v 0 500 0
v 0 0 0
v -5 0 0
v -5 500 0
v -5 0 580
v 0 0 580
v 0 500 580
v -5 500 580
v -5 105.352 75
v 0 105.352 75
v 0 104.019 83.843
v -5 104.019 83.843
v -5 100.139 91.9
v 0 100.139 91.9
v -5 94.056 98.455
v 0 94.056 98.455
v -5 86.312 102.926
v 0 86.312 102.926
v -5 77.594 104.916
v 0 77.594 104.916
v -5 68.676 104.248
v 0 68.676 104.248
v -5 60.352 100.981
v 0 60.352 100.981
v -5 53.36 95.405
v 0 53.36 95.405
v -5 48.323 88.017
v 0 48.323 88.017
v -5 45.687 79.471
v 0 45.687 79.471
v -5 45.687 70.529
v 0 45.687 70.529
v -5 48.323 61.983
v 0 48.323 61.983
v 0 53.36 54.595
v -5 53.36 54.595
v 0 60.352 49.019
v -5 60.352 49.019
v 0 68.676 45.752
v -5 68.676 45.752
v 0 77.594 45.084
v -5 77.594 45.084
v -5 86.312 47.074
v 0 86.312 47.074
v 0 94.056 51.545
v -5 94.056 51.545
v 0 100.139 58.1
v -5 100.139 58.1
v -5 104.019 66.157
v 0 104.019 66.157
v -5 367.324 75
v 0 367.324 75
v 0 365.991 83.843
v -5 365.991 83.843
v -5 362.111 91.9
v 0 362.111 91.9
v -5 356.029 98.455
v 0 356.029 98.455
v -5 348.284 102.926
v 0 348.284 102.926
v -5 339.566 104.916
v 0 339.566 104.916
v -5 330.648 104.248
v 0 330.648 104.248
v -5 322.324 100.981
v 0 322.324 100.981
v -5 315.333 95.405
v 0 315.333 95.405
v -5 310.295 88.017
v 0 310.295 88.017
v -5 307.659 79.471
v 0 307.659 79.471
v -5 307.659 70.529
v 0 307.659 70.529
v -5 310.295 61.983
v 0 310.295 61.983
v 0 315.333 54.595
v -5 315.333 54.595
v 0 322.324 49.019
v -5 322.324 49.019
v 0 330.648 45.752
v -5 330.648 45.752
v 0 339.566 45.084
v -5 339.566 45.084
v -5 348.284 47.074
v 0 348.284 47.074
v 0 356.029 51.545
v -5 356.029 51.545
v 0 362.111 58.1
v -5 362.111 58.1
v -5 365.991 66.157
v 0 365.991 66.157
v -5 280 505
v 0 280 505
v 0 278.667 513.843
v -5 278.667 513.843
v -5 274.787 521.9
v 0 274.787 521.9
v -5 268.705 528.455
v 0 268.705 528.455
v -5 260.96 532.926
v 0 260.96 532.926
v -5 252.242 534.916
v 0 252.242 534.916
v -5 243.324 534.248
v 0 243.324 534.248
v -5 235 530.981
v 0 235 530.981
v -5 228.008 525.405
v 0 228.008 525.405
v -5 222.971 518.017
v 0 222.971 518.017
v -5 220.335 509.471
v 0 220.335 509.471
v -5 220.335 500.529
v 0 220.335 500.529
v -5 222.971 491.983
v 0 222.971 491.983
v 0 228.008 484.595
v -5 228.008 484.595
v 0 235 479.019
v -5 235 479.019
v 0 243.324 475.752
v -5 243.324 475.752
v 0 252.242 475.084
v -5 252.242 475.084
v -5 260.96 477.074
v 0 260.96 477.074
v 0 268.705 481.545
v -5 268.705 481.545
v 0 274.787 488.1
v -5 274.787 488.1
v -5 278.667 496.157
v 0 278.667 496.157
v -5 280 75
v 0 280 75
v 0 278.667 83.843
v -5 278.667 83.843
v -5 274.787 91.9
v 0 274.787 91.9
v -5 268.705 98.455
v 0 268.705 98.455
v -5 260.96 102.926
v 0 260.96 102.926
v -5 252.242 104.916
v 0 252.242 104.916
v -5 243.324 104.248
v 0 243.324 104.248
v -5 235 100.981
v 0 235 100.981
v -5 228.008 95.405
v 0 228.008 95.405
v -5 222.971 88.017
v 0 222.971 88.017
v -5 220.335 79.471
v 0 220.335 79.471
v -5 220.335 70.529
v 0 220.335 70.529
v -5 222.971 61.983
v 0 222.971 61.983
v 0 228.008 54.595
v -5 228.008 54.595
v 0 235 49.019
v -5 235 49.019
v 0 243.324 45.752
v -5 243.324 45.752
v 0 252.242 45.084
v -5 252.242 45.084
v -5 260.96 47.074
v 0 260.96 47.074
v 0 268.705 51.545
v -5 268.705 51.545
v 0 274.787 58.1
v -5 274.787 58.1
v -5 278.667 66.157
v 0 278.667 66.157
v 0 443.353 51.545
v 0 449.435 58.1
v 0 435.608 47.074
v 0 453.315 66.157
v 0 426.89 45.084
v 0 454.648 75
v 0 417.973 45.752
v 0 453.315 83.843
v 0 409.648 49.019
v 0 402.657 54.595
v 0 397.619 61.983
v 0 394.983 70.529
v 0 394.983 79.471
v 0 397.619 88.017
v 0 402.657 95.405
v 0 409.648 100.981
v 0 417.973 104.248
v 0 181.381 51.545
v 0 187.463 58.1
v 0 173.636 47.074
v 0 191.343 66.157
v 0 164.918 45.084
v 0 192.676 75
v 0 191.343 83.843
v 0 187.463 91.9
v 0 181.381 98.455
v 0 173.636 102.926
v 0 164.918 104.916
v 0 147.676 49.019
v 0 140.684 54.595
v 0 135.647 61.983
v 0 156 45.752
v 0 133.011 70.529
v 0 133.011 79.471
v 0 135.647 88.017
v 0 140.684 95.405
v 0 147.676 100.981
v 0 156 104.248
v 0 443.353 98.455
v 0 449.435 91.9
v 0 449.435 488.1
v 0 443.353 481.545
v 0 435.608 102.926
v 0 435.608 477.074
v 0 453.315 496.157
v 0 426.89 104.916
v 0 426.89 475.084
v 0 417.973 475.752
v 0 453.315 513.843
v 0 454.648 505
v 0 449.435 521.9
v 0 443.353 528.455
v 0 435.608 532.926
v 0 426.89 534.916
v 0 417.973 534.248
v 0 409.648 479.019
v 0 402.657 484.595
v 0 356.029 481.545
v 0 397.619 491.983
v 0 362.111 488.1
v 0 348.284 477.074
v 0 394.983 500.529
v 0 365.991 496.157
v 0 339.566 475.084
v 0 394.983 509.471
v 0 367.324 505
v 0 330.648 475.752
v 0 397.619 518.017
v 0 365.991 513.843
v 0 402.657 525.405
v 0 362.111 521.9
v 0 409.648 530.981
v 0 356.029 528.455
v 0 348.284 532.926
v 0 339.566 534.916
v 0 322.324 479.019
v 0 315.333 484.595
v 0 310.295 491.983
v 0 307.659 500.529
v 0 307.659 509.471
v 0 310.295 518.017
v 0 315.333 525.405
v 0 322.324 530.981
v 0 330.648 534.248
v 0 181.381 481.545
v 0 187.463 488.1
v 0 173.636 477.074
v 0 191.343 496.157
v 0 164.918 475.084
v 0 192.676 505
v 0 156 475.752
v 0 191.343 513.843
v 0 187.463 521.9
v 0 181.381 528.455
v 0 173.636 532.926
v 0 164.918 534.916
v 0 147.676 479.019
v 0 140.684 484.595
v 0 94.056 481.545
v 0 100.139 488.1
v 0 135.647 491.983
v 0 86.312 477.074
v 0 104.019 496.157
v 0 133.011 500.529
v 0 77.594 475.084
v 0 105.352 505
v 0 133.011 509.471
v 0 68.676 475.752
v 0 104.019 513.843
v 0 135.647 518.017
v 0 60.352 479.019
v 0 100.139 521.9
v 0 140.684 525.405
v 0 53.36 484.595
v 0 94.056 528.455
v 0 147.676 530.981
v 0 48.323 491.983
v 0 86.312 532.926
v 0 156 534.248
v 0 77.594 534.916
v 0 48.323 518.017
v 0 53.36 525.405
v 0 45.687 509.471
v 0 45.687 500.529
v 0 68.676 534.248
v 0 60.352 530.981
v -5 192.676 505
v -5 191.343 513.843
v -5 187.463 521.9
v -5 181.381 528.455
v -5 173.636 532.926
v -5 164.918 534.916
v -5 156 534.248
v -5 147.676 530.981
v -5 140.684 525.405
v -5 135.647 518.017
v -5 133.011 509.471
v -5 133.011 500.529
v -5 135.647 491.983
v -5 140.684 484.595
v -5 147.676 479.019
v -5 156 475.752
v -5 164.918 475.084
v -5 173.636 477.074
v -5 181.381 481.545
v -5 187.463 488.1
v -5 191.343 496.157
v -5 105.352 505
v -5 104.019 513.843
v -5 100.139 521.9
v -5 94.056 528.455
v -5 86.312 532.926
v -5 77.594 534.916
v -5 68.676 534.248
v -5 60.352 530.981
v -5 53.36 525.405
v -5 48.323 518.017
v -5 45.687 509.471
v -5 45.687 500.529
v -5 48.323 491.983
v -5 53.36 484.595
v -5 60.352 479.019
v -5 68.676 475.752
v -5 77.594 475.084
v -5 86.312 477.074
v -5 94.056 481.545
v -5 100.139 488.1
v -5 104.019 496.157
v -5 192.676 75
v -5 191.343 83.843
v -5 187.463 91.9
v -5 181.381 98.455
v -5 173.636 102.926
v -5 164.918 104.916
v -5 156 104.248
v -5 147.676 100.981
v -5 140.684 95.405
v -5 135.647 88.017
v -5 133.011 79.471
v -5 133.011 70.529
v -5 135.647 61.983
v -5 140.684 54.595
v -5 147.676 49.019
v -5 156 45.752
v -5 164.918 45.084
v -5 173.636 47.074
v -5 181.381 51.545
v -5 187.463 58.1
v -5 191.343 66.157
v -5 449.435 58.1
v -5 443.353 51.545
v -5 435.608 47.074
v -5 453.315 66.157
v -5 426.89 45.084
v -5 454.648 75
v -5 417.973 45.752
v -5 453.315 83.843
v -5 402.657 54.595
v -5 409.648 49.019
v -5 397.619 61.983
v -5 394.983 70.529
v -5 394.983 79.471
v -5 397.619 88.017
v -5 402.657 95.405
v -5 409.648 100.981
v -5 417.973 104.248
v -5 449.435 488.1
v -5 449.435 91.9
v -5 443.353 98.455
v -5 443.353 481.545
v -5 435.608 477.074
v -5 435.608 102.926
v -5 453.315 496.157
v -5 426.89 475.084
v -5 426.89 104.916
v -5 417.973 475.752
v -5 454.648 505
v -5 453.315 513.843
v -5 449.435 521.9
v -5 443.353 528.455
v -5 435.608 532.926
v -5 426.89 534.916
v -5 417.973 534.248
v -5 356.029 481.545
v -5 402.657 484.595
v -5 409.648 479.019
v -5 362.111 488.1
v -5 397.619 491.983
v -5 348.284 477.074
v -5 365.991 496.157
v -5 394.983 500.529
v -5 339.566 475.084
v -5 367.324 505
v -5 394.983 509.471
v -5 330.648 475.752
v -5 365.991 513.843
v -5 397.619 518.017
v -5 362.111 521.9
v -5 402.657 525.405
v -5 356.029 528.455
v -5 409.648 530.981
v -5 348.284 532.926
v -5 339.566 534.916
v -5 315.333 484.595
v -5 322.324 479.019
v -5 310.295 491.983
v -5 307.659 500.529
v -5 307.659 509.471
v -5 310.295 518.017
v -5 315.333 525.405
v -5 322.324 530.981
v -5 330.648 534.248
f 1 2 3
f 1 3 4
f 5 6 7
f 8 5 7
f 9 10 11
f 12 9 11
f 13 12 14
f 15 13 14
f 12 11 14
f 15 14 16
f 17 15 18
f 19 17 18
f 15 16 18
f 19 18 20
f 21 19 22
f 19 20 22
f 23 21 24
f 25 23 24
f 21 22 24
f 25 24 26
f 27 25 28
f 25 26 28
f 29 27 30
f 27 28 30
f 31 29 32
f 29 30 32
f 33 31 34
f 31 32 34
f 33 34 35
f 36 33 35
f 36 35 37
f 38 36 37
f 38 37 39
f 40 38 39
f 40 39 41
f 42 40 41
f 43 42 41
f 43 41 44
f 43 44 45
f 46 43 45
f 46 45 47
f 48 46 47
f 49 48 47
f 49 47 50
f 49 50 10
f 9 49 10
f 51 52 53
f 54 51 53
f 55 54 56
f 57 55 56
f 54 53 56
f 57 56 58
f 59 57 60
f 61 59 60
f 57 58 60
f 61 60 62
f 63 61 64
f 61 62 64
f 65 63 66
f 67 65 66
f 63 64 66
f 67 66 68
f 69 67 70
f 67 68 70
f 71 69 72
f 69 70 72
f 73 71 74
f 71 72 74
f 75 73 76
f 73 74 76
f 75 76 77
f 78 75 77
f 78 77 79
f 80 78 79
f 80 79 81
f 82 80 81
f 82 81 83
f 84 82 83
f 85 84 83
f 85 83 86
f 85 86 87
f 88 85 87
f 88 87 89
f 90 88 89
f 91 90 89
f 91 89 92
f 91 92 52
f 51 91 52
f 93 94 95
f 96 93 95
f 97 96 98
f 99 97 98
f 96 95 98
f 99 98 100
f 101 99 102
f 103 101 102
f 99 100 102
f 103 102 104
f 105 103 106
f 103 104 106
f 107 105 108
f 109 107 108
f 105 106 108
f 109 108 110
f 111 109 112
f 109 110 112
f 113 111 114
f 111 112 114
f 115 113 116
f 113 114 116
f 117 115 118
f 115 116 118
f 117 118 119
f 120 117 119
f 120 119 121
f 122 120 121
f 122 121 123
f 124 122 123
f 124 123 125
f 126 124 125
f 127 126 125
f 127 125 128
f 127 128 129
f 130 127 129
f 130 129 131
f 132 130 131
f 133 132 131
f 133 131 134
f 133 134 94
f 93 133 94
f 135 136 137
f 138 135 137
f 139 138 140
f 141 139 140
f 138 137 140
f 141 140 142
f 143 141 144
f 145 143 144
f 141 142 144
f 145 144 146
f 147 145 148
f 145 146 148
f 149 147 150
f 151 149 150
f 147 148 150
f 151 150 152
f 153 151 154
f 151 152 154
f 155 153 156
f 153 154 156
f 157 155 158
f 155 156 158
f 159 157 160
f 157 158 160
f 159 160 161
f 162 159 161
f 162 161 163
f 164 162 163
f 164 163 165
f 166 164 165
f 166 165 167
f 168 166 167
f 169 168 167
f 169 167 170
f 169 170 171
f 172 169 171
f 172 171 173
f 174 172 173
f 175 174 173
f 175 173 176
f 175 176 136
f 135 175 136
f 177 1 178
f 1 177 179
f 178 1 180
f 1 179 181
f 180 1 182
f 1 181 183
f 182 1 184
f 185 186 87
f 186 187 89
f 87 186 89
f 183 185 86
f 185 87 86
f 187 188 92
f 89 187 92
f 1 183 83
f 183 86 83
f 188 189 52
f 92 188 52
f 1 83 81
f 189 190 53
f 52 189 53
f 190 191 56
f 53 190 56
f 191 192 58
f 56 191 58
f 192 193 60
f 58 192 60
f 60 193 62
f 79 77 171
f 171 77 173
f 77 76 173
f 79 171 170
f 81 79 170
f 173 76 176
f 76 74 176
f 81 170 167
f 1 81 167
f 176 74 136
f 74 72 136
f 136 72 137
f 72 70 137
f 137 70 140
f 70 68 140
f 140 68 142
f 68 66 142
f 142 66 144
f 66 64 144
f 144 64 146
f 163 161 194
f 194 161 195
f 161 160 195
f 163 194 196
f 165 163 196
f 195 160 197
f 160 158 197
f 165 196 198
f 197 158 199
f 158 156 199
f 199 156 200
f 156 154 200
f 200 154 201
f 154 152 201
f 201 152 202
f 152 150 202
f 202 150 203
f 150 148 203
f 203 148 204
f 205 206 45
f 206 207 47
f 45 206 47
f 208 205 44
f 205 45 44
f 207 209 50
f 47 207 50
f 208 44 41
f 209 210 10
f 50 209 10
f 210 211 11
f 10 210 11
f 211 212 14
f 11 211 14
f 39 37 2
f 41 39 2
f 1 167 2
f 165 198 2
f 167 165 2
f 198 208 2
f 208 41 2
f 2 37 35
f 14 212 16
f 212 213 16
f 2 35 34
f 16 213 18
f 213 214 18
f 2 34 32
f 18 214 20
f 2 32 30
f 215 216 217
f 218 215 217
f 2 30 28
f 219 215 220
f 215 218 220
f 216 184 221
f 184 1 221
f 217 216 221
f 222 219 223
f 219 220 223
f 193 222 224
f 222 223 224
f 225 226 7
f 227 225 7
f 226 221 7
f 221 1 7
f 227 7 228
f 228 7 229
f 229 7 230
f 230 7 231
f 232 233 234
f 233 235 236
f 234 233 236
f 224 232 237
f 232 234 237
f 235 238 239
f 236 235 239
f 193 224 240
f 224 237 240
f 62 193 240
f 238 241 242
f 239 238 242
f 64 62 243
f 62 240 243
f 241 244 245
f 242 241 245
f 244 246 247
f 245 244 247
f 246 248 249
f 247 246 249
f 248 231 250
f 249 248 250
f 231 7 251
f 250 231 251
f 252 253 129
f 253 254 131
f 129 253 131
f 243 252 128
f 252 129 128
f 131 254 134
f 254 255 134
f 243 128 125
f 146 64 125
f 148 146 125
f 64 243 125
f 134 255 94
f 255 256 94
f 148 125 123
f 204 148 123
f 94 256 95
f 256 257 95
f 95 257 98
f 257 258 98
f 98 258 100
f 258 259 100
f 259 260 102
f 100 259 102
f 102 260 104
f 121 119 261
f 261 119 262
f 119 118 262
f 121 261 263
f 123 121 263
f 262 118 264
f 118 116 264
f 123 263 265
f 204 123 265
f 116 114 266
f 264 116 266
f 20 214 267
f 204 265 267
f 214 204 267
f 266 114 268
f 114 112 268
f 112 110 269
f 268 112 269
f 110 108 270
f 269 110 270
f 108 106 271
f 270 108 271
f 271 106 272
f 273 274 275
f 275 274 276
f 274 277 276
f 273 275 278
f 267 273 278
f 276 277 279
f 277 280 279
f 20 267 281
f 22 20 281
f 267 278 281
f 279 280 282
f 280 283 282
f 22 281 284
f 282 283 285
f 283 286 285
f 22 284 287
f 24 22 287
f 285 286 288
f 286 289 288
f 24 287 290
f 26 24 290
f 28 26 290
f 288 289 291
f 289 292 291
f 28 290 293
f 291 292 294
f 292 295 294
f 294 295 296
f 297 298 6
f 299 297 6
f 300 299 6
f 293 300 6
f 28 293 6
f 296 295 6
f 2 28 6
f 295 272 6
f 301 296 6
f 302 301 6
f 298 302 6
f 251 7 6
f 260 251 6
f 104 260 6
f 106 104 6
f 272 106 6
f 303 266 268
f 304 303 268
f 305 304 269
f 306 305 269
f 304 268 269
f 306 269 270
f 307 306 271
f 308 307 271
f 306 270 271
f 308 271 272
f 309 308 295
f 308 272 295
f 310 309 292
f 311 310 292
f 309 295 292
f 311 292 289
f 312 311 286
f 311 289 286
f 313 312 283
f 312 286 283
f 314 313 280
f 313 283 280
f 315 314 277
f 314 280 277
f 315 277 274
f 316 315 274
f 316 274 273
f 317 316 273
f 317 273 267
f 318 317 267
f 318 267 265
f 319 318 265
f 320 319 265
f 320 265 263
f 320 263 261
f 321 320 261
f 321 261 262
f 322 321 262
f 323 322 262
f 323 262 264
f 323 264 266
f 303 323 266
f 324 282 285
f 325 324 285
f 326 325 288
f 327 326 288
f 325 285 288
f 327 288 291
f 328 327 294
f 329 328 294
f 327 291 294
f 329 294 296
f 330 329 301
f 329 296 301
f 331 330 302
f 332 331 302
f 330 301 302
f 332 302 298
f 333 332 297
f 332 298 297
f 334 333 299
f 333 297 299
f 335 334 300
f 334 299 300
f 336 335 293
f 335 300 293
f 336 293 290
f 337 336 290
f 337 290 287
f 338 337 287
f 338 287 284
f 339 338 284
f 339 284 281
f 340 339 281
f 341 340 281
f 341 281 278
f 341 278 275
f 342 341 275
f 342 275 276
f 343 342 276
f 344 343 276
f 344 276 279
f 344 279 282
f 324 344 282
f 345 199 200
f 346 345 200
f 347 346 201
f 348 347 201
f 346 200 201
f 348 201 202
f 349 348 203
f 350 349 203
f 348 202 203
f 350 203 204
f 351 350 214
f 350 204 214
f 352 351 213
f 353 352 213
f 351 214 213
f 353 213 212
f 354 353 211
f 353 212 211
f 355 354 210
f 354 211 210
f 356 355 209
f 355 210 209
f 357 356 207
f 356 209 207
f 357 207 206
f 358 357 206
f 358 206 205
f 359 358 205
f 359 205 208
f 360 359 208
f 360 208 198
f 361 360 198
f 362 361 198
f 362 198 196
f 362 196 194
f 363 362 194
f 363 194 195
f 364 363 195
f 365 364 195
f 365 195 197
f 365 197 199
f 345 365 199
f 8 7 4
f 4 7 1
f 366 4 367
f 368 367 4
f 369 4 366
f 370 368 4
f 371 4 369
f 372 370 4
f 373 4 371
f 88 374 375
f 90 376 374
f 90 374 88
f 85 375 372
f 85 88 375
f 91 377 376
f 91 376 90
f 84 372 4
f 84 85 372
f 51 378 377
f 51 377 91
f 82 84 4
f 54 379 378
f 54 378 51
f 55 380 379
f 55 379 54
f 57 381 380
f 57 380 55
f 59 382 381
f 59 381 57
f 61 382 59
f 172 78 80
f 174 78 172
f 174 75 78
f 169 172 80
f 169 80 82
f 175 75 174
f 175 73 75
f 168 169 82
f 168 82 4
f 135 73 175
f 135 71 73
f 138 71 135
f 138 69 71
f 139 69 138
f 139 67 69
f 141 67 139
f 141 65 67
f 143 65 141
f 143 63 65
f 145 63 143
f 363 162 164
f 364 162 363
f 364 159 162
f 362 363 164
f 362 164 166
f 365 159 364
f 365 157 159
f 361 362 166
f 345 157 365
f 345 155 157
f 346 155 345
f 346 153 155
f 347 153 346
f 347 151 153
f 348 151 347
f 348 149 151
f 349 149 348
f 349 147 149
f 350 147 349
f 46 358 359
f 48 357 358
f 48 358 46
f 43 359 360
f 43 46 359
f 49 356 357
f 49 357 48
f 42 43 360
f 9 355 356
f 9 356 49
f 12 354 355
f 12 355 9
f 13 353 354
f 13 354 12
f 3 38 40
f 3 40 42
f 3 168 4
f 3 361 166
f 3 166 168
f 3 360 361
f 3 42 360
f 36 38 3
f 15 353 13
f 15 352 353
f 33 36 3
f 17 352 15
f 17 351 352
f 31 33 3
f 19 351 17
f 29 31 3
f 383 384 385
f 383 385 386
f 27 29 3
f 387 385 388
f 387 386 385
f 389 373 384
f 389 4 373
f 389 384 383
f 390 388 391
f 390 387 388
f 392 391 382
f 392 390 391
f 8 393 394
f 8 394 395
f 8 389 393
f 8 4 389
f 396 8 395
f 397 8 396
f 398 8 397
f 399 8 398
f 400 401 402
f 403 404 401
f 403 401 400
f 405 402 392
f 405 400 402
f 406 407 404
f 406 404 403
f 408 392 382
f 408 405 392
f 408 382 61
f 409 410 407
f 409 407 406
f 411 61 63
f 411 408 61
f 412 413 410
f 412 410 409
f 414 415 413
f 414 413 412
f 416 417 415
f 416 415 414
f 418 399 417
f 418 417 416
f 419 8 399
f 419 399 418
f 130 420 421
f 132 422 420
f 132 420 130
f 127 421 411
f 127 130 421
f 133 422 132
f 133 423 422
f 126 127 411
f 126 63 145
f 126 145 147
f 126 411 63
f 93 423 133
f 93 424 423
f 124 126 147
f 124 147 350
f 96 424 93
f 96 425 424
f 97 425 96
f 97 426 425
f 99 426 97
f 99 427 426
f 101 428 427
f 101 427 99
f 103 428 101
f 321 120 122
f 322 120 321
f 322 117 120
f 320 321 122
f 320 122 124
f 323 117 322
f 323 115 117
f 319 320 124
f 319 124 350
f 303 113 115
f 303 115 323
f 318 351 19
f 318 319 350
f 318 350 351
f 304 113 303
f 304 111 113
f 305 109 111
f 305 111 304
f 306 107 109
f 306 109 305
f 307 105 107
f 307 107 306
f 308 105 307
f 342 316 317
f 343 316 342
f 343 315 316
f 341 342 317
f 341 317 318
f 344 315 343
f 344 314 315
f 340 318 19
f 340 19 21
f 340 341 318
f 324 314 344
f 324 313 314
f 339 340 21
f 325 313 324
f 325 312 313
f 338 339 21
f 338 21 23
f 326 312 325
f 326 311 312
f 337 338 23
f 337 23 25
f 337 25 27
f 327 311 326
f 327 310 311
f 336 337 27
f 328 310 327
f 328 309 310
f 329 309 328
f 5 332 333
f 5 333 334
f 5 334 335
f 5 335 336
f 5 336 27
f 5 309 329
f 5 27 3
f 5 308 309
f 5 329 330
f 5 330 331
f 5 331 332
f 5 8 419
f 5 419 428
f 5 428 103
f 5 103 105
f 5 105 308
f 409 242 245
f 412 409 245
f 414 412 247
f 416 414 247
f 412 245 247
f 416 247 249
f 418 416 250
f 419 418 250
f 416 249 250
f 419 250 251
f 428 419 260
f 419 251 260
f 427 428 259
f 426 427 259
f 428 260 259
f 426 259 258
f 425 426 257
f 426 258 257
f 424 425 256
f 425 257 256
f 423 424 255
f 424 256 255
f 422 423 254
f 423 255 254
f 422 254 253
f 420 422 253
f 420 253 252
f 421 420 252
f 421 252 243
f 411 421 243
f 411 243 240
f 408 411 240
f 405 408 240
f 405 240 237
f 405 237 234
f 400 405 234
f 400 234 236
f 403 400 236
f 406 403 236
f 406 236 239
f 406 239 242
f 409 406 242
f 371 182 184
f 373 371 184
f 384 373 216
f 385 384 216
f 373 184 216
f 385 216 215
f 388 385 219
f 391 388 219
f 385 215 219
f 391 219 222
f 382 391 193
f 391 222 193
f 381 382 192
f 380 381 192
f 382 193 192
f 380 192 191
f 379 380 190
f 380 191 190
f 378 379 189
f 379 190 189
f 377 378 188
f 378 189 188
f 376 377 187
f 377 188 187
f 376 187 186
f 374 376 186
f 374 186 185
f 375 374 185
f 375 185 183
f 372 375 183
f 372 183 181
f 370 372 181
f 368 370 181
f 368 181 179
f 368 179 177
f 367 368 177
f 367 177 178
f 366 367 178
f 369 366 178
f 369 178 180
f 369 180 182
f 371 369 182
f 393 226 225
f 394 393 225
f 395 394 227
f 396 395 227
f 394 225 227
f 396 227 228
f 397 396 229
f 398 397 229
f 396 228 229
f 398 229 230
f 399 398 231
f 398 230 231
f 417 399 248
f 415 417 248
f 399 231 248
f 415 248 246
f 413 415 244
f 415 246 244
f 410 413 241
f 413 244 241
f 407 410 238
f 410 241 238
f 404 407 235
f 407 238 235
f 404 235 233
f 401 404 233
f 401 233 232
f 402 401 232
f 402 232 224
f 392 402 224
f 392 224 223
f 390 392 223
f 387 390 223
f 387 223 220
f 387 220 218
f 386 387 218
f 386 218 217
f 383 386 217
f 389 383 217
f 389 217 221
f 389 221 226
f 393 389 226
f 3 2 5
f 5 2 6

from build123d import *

# Parameters (mm, degrees)
PAD_DEPTH    = 5
SKETCH002_R  = 30
POCKET_DEPTH = 5.001


with BuildPart() as part:
    # Sketch → Pad (new body)
    with BuildSketch(Plane.YZ):
        Polygon((0, 0), (0, 580), (500, 580), (500, 0), (250, 0), align=None)
    extrude(amount=-PAD_DEPTH)

    # Sketch002 (on Face6 of Pad) → Pocket (cut, through all)
    with BuildSketch(Plane.YZ):
        with Locations((250, 505)):
            Circle(SKETCH002_R)
        with Locations((250, 75)):
            Circle(SKETCH002_R)
        with Locations((75.351784, 505)):
            Circle(SKETCH002_R)
        with Locations((75.351784, 75)):
            Circle(SKETCH002_R)
        with Locations((162.675892, 75)):
            Circle(SKETCH002_R)
        with Locations((337.324108, 75)):
            Circle(SKETCH002_R)
        with Locations((424.648216, 75)):
            Circle(SKETCH002_R)
        with Locations((424.648216, 505)):
            Circle(SKETCH002_R)
        with Locations((337.324108, 505)):
            Circle(SKETCH002_R)
        with Locations((162.675892, 505)):
            Circle(SKETCH002_R)
    extrude(amount=-POCKET_DEPTH, mode=Mode.SUBTRACT)


solid = part.part
